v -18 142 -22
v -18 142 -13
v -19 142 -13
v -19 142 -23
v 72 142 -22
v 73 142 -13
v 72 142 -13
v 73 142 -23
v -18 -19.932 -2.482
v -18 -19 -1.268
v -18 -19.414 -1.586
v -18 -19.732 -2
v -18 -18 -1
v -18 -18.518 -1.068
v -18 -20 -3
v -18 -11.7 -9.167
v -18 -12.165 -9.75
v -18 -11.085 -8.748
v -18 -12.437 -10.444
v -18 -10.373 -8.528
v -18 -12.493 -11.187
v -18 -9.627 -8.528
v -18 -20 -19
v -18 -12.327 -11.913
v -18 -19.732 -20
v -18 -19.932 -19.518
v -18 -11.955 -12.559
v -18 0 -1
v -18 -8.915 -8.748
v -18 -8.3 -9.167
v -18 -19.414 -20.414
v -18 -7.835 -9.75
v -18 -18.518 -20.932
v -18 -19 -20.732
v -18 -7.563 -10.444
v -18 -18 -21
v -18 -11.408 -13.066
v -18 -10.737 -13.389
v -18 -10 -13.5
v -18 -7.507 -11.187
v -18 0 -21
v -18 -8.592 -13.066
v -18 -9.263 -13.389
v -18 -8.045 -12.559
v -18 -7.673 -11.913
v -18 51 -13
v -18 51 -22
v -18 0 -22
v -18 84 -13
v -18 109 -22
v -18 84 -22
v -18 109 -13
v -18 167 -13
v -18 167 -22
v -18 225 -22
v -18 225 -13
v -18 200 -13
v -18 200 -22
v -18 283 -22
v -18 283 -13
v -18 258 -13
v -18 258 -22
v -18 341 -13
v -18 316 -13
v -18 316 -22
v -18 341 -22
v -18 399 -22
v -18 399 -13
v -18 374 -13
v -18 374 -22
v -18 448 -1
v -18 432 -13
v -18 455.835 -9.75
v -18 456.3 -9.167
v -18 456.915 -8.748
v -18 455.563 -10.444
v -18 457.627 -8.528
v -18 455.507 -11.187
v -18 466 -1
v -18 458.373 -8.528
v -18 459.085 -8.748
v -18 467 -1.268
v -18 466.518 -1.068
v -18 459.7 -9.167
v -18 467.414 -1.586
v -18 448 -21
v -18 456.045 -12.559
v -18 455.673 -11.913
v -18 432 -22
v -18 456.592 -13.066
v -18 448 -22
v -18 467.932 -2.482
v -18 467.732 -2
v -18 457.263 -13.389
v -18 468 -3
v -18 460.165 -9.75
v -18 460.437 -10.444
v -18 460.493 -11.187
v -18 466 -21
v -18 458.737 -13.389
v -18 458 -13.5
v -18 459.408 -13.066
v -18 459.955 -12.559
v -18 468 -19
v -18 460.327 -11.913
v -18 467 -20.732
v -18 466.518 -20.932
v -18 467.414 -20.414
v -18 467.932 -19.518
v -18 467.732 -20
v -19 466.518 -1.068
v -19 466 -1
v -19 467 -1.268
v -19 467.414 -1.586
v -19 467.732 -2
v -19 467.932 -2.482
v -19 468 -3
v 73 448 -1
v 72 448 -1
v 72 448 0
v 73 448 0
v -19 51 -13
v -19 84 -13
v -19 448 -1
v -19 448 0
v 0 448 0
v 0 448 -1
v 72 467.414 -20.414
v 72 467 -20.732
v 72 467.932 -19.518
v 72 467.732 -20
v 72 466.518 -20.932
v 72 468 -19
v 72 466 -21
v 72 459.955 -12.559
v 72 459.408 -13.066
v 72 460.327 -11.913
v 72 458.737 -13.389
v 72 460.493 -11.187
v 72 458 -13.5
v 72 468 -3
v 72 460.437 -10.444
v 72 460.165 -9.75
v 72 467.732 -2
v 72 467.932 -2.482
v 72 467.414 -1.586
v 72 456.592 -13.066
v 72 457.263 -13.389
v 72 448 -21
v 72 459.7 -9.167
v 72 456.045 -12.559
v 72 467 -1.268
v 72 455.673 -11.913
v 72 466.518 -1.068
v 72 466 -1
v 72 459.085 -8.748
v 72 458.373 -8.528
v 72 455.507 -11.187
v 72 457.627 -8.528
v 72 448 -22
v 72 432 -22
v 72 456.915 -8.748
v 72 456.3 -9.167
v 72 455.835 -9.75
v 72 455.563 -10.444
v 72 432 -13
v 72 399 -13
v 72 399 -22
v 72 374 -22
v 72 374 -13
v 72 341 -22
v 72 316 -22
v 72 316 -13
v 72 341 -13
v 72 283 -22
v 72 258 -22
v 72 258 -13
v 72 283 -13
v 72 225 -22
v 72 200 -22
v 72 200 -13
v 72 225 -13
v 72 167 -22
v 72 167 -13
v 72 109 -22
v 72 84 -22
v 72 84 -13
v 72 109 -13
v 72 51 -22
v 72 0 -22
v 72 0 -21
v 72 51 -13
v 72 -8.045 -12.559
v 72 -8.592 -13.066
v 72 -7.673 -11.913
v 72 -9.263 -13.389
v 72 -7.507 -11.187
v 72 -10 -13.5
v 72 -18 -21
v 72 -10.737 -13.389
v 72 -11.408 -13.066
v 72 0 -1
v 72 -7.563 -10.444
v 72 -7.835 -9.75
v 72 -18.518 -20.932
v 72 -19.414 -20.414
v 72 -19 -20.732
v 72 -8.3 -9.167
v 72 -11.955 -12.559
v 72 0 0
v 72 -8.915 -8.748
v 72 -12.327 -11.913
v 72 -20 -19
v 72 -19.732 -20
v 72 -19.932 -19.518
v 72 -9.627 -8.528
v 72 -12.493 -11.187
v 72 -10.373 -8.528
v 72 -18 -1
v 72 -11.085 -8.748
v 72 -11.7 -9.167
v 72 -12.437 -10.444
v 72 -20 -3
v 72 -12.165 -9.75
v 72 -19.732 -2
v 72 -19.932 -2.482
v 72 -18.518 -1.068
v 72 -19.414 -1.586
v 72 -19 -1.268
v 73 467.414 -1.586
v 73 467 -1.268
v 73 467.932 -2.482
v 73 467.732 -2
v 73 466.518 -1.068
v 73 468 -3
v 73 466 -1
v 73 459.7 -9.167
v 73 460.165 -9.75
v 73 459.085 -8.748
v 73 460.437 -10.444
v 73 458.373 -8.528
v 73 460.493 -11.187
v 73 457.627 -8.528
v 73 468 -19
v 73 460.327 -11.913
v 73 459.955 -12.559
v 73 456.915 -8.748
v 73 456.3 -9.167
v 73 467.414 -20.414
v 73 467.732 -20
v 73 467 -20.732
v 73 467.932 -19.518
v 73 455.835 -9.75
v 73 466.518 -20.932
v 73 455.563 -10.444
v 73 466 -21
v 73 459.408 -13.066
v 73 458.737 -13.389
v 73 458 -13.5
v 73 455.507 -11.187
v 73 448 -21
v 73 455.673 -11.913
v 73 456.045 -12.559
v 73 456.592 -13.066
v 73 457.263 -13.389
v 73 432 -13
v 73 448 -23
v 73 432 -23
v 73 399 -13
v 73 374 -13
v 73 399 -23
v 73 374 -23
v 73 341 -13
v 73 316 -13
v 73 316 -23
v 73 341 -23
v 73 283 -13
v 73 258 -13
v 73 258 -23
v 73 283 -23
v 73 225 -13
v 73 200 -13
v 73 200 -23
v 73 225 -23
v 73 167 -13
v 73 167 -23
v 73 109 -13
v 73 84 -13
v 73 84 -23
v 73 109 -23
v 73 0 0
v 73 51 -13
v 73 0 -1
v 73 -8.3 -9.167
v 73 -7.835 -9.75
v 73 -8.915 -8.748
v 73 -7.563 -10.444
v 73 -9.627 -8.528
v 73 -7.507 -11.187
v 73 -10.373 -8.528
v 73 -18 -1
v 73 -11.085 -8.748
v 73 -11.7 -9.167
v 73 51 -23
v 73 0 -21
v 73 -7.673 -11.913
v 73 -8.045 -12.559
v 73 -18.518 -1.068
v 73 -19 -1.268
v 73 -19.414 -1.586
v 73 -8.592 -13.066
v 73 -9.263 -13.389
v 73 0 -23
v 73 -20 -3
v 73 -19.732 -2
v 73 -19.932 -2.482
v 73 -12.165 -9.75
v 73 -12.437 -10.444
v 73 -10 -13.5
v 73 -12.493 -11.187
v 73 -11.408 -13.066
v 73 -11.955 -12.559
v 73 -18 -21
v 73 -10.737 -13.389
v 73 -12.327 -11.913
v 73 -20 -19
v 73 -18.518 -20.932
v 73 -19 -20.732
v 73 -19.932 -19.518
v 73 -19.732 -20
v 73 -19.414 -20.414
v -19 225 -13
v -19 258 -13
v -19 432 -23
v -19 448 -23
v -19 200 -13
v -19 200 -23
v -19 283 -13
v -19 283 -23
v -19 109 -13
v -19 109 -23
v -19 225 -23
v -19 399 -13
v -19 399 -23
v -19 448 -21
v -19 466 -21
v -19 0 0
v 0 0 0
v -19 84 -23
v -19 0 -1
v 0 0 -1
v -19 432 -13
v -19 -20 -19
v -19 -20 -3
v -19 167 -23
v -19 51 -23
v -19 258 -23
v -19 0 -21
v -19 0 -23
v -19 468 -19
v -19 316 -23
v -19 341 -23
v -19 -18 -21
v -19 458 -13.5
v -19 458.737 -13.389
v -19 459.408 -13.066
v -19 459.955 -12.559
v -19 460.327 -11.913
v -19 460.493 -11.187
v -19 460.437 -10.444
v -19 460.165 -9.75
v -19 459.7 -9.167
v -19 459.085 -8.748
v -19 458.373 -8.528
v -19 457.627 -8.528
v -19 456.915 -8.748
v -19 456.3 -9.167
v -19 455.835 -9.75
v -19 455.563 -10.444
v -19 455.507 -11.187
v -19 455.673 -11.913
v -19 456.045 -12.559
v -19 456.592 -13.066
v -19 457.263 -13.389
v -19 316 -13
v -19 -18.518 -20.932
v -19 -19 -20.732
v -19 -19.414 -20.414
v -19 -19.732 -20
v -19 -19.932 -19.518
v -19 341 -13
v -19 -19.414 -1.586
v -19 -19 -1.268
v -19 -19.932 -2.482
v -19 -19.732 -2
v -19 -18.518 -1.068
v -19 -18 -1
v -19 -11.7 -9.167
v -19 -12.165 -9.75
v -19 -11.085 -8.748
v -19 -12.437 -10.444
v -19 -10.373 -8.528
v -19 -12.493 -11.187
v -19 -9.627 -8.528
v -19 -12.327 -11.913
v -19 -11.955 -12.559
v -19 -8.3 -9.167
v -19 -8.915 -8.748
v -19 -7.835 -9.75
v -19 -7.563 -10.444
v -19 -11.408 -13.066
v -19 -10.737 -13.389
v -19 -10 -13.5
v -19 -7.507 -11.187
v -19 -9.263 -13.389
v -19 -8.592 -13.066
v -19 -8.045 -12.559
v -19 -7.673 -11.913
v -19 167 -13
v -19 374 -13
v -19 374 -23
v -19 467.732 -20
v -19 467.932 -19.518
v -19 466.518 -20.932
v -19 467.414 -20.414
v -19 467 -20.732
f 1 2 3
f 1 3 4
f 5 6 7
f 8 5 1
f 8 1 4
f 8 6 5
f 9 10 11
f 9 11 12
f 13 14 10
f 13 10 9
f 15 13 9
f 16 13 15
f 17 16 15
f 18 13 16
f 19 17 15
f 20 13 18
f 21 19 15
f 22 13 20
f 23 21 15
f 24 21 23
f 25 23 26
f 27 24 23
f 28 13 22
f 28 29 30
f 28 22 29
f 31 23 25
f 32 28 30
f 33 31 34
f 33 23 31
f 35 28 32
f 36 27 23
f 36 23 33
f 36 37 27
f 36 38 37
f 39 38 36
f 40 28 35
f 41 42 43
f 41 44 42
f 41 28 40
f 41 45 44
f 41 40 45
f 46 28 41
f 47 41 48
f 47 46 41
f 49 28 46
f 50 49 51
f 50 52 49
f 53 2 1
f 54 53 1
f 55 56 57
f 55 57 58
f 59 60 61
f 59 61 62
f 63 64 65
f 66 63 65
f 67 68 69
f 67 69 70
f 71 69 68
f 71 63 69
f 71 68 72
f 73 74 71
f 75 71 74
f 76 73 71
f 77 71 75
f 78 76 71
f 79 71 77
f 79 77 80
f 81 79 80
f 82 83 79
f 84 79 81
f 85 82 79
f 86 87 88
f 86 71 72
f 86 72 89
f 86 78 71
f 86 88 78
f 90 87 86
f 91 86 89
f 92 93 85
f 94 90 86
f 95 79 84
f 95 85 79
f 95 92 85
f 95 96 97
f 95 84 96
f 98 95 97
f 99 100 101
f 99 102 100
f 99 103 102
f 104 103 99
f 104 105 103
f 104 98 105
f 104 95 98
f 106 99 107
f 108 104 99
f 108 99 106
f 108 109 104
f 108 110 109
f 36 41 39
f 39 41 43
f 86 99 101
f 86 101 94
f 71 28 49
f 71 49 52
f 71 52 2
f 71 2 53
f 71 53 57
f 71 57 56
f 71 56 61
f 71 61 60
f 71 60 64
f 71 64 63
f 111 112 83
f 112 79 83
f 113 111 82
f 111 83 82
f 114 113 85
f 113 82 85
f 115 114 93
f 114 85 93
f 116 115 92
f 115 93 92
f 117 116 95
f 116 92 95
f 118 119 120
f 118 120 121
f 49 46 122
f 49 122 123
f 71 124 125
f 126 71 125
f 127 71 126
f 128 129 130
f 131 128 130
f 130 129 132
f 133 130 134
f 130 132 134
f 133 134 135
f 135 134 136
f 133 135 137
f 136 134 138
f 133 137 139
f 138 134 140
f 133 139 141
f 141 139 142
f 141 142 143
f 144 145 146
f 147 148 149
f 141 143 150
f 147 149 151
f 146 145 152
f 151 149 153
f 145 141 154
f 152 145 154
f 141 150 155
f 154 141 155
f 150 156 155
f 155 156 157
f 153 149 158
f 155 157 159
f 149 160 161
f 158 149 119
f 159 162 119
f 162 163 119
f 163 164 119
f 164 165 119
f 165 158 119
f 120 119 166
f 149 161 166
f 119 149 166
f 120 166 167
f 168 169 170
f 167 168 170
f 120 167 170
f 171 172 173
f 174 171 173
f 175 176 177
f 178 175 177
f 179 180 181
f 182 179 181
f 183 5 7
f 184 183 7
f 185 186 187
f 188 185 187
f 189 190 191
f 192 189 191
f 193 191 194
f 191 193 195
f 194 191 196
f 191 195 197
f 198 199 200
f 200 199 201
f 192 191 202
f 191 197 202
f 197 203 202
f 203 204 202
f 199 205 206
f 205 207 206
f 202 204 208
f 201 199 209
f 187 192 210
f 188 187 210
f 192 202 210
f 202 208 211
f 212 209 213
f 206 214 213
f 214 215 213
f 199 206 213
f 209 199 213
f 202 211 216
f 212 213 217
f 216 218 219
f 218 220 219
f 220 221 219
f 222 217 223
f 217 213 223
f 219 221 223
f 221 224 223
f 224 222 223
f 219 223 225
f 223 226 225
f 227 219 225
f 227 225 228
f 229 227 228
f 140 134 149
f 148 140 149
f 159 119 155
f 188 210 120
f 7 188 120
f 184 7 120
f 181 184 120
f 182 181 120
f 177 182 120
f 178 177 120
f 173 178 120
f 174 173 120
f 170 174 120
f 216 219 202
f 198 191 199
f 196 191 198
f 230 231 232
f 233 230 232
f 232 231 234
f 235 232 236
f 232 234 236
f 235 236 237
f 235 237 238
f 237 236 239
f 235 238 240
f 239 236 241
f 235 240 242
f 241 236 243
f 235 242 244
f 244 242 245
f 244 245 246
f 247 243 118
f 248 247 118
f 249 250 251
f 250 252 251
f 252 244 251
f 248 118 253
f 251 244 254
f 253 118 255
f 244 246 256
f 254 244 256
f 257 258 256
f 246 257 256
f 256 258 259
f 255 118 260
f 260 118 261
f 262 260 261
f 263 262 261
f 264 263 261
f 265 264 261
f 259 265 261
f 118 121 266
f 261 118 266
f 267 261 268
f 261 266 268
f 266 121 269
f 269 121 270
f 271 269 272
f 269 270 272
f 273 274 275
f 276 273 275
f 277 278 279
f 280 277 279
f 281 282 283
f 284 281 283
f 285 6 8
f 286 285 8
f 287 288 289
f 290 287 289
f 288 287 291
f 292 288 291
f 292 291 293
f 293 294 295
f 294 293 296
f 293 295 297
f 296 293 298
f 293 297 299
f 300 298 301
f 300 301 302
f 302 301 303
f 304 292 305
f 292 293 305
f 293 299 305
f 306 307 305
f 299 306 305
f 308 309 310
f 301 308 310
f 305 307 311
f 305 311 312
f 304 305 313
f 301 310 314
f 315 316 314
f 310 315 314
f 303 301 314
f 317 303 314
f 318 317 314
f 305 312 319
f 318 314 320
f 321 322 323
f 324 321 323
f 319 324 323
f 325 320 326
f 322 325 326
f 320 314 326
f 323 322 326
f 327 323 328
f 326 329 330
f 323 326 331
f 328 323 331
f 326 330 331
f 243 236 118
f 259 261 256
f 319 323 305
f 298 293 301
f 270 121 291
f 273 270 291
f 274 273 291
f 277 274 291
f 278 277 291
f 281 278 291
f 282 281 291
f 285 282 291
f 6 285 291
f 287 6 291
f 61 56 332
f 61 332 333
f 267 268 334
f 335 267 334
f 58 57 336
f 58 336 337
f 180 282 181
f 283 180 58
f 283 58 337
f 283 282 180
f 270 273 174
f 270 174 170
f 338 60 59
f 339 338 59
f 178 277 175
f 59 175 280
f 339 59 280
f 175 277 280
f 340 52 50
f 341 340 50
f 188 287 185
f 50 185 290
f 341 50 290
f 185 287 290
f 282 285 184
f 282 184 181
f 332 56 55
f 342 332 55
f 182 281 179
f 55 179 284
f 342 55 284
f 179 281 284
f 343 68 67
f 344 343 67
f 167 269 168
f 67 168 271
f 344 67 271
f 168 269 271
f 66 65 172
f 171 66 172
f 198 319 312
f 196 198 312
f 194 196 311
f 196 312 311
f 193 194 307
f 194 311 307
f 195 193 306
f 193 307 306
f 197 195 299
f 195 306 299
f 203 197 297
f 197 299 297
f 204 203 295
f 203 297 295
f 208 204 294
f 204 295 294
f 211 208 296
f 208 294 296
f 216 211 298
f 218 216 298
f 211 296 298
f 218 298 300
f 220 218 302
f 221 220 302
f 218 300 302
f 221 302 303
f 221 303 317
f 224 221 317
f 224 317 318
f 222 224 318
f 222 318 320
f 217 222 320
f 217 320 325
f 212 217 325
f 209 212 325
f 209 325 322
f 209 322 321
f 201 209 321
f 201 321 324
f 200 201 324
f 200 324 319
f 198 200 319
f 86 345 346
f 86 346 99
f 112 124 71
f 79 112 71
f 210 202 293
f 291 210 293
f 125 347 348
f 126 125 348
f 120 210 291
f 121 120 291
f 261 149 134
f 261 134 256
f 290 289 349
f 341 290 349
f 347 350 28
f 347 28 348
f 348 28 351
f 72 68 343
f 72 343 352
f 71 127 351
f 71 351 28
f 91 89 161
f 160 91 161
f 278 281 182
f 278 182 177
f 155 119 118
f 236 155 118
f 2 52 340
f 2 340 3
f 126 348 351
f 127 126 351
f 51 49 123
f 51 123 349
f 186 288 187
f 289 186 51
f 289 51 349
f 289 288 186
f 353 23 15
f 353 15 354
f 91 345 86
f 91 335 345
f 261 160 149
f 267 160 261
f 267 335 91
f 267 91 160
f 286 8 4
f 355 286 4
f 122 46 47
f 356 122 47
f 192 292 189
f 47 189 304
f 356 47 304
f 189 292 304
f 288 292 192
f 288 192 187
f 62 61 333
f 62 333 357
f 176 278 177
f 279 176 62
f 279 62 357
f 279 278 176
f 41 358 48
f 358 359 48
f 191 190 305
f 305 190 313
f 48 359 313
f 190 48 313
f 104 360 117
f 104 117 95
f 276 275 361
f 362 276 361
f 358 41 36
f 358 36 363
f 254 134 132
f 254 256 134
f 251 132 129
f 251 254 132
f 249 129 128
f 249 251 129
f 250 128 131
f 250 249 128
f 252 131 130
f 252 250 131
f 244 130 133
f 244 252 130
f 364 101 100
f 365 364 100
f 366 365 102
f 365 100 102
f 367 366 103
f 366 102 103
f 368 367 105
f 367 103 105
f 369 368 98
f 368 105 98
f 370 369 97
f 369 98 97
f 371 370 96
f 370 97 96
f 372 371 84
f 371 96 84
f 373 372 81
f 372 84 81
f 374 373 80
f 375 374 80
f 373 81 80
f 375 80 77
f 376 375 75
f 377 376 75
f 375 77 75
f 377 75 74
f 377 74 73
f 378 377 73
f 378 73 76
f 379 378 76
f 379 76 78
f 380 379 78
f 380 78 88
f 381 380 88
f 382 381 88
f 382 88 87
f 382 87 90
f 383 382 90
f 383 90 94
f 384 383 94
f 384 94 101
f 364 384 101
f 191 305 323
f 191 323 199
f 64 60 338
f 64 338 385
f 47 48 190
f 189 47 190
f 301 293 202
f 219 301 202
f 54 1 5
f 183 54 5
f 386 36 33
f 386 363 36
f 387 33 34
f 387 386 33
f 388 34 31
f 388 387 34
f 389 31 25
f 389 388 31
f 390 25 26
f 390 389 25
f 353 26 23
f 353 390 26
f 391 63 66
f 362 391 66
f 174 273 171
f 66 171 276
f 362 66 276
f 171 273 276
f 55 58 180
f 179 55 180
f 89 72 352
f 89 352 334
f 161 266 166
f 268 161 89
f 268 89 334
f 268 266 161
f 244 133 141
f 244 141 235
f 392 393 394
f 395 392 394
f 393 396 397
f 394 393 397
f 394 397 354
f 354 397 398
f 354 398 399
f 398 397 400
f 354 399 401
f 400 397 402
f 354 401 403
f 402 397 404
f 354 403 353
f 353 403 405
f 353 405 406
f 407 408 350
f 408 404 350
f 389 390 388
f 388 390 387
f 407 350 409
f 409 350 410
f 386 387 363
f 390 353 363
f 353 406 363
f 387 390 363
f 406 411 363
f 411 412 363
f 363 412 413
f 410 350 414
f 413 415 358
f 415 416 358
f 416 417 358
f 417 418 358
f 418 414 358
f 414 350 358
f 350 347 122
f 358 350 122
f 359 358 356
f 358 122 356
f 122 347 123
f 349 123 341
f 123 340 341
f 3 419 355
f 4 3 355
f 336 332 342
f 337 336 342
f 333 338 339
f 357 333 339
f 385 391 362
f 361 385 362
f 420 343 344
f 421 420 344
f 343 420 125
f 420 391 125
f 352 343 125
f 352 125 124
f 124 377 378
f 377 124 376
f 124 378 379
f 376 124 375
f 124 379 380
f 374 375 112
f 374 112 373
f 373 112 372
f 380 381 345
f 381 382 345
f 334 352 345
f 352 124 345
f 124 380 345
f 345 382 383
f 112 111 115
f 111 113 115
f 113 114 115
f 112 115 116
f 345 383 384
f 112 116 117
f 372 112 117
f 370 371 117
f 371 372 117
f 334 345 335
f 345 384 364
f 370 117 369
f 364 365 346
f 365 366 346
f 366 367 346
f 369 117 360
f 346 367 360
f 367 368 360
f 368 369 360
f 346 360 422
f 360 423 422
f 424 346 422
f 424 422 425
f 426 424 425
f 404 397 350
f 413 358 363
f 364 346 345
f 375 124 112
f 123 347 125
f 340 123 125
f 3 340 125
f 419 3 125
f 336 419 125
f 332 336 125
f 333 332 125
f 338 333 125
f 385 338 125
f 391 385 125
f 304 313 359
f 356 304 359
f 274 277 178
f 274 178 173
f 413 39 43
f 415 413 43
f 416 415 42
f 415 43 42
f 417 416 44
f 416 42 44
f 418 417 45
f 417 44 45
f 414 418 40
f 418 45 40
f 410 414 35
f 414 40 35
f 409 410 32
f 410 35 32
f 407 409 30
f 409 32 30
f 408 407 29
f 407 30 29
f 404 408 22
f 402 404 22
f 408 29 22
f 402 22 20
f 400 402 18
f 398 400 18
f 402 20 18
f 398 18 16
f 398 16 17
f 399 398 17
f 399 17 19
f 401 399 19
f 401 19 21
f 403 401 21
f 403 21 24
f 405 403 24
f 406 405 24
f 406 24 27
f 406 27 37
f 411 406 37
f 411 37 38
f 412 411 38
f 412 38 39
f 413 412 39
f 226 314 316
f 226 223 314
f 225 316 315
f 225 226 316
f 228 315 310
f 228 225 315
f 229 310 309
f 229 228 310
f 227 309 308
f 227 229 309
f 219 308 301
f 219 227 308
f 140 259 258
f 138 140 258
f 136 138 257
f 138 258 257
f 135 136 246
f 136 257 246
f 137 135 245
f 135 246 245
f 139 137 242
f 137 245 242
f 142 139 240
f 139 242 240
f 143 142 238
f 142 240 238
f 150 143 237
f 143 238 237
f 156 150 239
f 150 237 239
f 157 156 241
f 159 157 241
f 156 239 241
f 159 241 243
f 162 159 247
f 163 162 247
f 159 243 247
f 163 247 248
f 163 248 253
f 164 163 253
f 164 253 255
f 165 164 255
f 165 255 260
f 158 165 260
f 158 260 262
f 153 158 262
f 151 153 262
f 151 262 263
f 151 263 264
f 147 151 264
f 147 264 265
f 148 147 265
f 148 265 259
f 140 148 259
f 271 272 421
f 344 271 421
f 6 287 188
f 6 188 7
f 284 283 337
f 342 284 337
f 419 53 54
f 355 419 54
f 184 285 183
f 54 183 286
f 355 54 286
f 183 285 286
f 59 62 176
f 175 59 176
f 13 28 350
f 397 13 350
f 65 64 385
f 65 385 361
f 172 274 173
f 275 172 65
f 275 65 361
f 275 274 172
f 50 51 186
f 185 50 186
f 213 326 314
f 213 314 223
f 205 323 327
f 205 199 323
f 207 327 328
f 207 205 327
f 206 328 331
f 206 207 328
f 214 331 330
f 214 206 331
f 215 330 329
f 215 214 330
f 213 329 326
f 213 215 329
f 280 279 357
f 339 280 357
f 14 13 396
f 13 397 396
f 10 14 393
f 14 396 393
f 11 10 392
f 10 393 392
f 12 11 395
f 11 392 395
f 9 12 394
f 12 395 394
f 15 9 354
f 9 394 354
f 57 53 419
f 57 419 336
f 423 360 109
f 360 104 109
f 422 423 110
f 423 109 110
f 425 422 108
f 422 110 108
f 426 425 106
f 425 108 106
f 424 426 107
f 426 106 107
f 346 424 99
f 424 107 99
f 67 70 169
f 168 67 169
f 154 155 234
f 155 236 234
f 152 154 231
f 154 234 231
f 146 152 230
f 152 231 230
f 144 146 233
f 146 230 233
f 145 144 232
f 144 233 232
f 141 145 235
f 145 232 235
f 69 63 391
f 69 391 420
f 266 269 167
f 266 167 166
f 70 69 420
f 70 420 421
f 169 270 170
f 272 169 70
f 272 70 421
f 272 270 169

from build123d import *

# Parameters (mm, degrees)
BOSS_EXTRUDE1_DEPTH = 448
SKETCH2_W           = 1
SKETCH2_H           = 20
BOSS_EXTRUDE2_DEPTH = 20
SKETCH3_W           = 1
SKETCH3_H           = 20
BOSS_EXTRUDE3_DEPTH = 20
FILLET1_R           = 2
SKETCH4_W           = 10
SKETCH4_H           = 33
CUT_EXTRUDE1_DEPTH  = 93
LPATTERN1_COUNT     = 7
LPATTERN1_PITCH     = 58
SKETCH5_R           = 2.5
CUT_EXTRUDE2_DEPTH  = 93


with BuildPart() as part:
    # Sketch1 → Boss-Extrude1 (new body)
    with BuildSketch(Plane(origin=(0, 0, 0), x_dir=(1, 0, 0), z_dir=(0, 1, 0))):
        Polygon((0, 0), (0, 1), (-18, 1), (-18, 22), (72, 22), (72, 0), (73, 0), (73, 23), (-19, 23), (-19, 0), align=None)
    extrude(amount=BOSS_EXTRUDE1_DEPTH)

    # Sketch2 → Boss-Extrude2 (add)
    with BuildSketch(Plane(origin=(0, 448, 0), x_dir=(1, 0, 0), z_dir=(0, 1, 0))):
        with Locations((-18.5, 11)):
            Rectangle(SKETCH2_W, SKETCH2_H)
        with Locations((72.5, 11)):
            Rectangle(SKETCH2_W, SKETCH2_H)
    extrude(amount=BOSS_EXTRUDE2_DEPTH)

    # Sketch3 → Boss-Extrude3 (add)
    with BuildSketch(Plane(origin=(0, 0, 0), x_dir=(-1, 0, 0), z_dir=(0, -1, 0))):
        with Locations((18.5, 11)):
            Rectangle(SKETCH3_W, SKETCH3_H)
        with Locations((-72.5, 11)):
            Rectangle(SKETCH3_W, SKETCH3_H)
    extrude(amount=BOSS_EXTRUDE3_DEPTH)

    # Fillet1
    fillet1_edges = [part.edges().sort_by_distance(p)[0] for p in [
        (-18.5, 468, -21),
        (-18.5, 468, -1),
        (72.5, 468, -1),
        (72.5, 468, -21),
        (-18.5, -20, -1),
        (-18.5, -20, -21),
        (72.5, -20, -21),
        (72.5, -20, -1),
    ]]
    fillet(fillet1_edges, radius=FILLET1_R)

    # Sketch4 → Cut-Extrude1 (cut, through all)
    with BuildSketch(Plane(origin=(73, 0, 0), x_dir=(0, 0, -1), z_dir=(1, 0, 0))):
        with Locations((18, 415.5)):
            Rectangle(SKETCH4_W, SKETCH4_H)
    cut_extrude1 = extrude(amount=-CUT_EXTRUDE1_DEPTH, mode=Mode.SUBTRACT)

    # LPattern1: Cut-Extrude1 ×7
    with Locations(*[(0, -i * LPATTERN1_PITCH, 0) for i in range(1, LPATTERN1_COUNT)]):
        add(cut_extrude1, mode=Mode.SUBTRACT)

    # Sketch5 → Cut-Extrude2 (cut, through all)
    with BuildSketch(Plane(origin=(73, 0, 0), x_dir=(0, 0, -1), z_dir=(1, 0, 0))):
        with Locations((11, 458)):
            Circle(SKETCH5_R)
        with Locations((11, -10)):
            Circle(SKETCH5_R)
    extrude(amount=-CUT_EXTRUDE2_DEPTH, mode=Mode.SUBTRACT)


solid = part.part
